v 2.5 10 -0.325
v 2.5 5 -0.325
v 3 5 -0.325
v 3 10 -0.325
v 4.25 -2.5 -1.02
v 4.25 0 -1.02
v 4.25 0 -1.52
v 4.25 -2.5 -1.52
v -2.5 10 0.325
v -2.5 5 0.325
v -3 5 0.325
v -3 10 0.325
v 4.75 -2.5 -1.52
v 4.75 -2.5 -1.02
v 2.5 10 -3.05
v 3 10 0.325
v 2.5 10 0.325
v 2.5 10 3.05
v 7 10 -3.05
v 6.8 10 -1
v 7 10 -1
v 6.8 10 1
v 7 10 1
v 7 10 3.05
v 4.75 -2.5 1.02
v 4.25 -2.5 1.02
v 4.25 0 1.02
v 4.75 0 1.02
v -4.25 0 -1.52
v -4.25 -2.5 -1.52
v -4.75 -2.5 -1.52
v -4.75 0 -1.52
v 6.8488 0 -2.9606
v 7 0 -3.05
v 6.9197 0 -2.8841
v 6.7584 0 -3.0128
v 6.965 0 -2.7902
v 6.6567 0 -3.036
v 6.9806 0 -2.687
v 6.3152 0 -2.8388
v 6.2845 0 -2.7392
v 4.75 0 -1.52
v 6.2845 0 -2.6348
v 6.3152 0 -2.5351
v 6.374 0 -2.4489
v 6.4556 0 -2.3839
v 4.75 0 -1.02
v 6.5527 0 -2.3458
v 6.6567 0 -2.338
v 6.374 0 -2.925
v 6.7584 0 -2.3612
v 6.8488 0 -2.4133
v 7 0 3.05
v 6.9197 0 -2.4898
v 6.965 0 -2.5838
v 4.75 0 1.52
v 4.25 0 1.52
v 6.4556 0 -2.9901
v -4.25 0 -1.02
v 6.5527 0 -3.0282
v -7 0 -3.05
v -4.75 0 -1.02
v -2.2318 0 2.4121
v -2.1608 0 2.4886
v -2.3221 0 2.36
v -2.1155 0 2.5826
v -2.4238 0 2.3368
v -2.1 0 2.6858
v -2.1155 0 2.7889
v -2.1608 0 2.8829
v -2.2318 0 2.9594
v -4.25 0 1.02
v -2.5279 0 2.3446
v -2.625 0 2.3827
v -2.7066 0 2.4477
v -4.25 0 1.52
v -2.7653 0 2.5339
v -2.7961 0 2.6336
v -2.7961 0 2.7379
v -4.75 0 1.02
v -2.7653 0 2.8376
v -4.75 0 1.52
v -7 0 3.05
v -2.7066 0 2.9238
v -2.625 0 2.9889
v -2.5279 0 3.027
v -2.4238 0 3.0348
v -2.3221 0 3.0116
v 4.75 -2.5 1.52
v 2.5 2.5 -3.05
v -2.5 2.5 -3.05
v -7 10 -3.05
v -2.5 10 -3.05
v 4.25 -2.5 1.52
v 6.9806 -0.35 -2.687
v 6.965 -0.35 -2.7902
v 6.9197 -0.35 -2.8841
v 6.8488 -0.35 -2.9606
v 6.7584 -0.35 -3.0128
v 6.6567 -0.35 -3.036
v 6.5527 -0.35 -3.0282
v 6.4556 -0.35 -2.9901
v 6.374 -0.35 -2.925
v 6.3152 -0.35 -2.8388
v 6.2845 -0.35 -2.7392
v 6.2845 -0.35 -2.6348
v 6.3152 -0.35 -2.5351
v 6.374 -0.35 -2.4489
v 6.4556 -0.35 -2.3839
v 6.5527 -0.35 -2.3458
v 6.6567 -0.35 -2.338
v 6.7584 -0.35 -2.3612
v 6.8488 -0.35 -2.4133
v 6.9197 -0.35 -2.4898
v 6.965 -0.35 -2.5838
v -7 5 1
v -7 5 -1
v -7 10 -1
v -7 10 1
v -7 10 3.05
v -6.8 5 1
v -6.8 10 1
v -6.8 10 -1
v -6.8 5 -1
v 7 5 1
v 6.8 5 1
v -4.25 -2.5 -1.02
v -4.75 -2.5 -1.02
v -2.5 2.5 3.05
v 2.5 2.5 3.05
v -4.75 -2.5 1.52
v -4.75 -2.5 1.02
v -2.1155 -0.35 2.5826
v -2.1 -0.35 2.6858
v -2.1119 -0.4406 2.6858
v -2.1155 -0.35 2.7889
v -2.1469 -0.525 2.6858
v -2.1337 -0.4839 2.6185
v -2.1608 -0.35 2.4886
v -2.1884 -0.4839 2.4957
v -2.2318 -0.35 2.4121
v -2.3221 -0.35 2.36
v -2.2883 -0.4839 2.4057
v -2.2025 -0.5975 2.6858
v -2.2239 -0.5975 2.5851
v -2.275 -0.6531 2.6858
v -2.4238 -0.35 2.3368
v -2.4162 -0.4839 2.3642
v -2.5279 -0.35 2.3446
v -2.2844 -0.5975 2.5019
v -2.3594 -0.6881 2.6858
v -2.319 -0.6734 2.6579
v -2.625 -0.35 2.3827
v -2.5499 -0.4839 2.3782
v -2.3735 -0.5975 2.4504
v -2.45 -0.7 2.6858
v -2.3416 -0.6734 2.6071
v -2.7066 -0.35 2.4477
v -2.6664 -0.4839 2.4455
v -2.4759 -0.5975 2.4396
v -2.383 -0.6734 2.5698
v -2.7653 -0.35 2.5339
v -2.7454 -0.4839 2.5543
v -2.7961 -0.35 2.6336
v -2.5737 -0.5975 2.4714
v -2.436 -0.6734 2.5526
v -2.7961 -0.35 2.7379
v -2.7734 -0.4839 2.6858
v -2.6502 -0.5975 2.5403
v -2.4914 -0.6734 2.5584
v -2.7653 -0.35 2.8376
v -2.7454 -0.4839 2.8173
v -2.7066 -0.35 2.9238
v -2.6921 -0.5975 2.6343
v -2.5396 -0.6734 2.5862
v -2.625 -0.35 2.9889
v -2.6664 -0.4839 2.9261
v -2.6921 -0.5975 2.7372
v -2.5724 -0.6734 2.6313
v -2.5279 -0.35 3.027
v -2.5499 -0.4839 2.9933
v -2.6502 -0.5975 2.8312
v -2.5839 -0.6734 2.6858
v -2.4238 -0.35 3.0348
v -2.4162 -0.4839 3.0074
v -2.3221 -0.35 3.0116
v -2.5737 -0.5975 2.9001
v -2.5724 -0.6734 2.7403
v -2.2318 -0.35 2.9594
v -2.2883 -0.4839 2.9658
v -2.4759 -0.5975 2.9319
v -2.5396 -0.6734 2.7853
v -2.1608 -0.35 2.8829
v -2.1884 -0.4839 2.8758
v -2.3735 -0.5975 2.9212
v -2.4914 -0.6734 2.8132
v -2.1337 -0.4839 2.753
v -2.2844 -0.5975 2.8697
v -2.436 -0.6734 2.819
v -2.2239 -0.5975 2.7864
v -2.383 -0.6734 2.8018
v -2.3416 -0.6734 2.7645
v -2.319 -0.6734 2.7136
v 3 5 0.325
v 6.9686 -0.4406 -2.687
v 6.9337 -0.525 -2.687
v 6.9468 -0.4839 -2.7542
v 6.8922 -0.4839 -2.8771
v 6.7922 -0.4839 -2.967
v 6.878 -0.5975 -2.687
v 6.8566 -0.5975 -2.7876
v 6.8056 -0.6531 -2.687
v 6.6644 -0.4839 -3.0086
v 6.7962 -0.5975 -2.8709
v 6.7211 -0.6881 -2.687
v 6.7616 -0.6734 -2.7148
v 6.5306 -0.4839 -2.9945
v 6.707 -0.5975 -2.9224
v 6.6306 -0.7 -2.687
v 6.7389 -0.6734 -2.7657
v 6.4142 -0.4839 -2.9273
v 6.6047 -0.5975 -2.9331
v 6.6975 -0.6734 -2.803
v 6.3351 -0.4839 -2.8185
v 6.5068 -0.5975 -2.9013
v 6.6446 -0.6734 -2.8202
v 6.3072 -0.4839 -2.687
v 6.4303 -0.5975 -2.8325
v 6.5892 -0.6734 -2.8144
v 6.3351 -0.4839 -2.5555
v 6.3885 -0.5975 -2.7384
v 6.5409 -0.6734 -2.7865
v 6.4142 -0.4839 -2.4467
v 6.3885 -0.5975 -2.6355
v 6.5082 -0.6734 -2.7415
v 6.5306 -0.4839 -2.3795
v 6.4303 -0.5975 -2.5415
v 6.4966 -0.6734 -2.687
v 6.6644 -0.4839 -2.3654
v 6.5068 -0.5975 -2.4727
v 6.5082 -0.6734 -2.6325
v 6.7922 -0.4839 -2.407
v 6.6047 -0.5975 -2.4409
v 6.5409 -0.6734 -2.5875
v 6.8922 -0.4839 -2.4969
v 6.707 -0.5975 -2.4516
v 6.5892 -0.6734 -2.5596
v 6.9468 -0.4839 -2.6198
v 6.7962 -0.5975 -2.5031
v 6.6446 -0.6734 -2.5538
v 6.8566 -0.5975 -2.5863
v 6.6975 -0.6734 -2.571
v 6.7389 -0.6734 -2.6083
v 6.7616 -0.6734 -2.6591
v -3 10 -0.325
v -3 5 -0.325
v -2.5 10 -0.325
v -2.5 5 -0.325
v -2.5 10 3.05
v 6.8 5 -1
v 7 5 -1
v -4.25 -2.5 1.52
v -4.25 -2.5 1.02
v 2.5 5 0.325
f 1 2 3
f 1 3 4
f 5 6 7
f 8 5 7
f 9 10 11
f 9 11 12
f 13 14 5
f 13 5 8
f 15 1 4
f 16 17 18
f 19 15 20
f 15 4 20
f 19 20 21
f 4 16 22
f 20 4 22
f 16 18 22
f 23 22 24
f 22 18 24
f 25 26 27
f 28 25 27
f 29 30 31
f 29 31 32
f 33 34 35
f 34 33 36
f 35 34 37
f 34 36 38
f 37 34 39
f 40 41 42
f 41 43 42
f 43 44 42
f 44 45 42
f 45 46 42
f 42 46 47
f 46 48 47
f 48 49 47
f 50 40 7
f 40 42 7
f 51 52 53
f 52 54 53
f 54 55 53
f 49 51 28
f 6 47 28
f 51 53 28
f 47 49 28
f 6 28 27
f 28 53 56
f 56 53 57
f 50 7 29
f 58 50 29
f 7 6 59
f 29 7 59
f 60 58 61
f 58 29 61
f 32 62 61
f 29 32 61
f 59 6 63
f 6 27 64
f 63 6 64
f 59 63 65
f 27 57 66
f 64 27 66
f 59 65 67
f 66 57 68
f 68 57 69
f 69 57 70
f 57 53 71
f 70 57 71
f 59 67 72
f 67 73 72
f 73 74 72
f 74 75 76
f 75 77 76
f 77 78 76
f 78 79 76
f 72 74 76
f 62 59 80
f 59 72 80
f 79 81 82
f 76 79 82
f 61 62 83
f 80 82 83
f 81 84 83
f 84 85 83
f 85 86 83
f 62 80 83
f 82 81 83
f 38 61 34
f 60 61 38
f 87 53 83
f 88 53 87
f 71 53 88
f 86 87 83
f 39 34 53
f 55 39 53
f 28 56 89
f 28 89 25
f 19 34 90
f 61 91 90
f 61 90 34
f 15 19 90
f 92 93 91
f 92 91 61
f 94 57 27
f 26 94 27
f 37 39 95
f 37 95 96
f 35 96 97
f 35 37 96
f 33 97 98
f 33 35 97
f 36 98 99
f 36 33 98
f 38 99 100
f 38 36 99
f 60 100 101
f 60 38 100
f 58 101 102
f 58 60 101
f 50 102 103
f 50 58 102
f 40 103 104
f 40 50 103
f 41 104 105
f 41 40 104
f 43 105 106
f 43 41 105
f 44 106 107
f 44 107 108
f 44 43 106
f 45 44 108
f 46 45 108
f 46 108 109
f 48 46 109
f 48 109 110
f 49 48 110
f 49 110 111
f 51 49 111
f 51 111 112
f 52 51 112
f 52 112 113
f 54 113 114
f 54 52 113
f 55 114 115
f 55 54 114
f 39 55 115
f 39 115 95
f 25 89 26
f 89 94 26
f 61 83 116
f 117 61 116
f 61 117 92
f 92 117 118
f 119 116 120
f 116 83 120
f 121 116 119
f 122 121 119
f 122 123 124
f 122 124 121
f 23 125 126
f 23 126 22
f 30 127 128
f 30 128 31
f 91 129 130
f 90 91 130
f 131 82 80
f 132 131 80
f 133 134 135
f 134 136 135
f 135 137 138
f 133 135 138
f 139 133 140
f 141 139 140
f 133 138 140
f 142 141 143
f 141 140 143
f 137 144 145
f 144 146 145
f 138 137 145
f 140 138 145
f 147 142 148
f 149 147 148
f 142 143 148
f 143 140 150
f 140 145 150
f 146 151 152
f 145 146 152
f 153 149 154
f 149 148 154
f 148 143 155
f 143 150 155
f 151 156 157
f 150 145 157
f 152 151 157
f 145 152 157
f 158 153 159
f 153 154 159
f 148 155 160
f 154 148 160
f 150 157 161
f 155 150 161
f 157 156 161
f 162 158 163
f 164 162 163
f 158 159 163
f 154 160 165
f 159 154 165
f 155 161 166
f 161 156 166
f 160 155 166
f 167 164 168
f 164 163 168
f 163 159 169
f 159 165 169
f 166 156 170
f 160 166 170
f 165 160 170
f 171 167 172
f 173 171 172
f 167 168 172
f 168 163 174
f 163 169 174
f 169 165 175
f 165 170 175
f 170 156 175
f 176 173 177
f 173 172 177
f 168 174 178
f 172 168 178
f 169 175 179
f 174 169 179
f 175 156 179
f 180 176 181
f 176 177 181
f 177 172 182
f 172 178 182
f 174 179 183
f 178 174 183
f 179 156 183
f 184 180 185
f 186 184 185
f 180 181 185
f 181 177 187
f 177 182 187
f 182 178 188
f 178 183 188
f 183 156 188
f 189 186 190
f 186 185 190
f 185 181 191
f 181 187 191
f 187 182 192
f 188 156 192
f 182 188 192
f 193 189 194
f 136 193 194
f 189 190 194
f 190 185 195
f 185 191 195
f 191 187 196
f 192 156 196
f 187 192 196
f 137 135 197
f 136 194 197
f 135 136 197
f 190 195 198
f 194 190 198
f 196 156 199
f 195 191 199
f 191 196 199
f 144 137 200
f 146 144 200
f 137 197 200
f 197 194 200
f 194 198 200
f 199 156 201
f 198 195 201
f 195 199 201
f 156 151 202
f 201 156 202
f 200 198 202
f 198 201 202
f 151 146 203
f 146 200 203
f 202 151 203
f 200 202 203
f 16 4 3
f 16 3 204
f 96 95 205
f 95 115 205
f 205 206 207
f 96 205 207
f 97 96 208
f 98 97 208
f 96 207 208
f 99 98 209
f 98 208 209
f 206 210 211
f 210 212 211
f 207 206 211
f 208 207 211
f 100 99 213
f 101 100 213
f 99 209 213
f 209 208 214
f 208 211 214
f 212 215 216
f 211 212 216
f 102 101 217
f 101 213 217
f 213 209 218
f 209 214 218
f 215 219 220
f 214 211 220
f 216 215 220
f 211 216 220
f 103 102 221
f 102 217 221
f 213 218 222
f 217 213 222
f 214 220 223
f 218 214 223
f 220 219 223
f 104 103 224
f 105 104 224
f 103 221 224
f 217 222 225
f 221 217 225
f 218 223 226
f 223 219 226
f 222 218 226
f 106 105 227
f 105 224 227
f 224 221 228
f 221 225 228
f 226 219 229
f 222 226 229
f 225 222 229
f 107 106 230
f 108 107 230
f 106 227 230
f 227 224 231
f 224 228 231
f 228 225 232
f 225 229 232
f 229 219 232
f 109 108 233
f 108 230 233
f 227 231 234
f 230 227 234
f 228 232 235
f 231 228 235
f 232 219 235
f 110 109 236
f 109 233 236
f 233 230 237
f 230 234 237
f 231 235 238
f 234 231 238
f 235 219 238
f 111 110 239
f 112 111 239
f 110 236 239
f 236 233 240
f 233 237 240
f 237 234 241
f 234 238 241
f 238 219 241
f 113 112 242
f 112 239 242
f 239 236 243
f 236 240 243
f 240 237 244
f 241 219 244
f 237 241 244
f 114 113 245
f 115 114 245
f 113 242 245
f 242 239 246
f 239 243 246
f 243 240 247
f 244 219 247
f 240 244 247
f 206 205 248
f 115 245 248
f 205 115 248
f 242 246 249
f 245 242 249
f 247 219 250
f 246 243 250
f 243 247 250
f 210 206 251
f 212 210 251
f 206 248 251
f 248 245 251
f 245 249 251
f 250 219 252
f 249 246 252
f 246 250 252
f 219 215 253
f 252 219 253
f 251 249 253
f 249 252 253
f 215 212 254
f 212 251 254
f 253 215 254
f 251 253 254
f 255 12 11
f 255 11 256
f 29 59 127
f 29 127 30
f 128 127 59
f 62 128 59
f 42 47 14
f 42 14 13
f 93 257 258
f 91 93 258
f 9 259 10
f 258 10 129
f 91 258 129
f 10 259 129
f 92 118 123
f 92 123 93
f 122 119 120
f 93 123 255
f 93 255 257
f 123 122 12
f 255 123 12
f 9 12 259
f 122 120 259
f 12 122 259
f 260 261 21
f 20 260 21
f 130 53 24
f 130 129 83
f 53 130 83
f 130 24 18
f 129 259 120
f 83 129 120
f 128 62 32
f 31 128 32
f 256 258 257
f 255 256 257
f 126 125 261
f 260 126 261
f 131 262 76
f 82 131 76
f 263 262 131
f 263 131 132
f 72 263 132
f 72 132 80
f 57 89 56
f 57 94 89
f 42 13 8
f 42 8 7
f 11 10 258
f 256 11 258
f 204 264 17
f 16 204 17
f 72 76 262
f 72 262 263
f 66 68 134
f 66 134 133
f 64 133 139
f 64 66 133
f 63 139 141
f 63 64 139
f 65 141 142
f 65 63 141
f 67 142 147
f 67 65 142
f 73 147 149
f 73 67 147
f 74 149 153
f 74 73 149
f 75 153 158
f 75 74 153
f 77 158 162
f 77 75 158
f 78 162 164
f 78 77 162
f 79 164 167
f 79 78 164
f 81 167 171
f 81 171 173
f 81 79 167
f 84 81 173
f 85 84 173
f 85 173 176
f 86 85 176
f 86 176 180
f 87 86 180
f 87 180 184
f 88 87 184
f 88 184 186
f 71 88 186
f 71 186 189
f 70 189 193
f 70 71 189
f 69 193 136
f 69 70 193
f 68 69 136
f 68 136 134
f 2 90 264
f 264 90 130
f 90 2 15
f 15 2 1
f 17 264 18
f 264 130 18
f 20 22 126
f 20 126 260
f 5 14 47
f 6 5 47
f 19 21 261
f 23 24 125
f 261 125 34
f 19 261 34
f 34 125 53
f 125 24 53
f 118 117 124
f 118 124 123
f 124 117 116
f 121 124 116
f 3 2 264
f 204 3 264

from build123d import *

# Parameters (mm, degrees)
EXTRUDE1_DEPTH           = 3.05
EXTRUDE1_DEPTH_BACK      = 3.05
EXTRUDE_THIN1_DEPTH      = 0.25
EXTRUDE_THIN1_DEPTH_BACK = 0.25
SKETCH2_W                = 0.5
SKETCH2_H                = 2.5
EXTRUDE_THIN2_DEPTH      = 0.25
EXTRUDE_THIN2_DEPTH_BACK = 0.25
SKETCH2_3_W              = 0.5
SKETCH2_3_H              = 2.5
EXTRUDE_THIN3_DEPTH      = 0.25
EXTRUDE_THIN3_DEPTH_BACK = 0.25
SKETCH3_W                = 0.5
SKETCH3_H                = 2.5
EXTRUDE_THIN4_DEPTH      = 0.25
EXTRUDE_THIN4_DEPTH_BACK = 0.25
SKETCH3_3_W              = 0.5
SKETCH3_3_H              = 2.5
SKETCH4_R                = 0.35
EXTRUDE2_DEPTH           = 0.7
FILLET1_R                = 0.35
SKETCH5_W                = 2
SKETCH5_H                = 5
CUT_EXTRUDE1_DEPTH       = 0.2
SKETCH6_W                = 2
SKETCH6_H                = 5
CUT_EXTRUDE2_DEPTH       = 0.2
SKETCH7_W                = 0.65
SKETCH7_H                = 5.045356776
CUT_EXTRUDE3_DEPTH       = 0.5
SKETCH8_W                = 0.65
SKETCH8_H                = 5.045356776
CUT_EXTRUDE4_DEPTH       = 0.5


with BuildPart() as part:
    # Sketch1 → Extrude1 (new, two sides: drawn at the far end of the back side and taken through both)
    with BuildSketch(Plane.XY.offset(-EXTRUDE1_DEPTH_BACK)):
        Polygon((2.5, 10), (7, 10), (7, 0), (-7, 0), (-7, 10), (-2.5, 10), (-2.5, 2.5), (2.5, 2.5), align=None)
    extrude(amount=EXTRUDE1_DEPTH + EXTRUDE1_DEPTH_BACK)

    # Sketch2 → Extrude-Thin1 (add, two sides: drawn at the far end of the back side and taken through both)
    with BuildSketch(Plane(origin=(4.5, 0, 0), x_dir=(0, 0, -1), z_dir=(1, 0, 0)).offset(-EXTRUDE_THIN1_DEPTH_BACK)):
        with Locations((1.27, -1.25)):
            Rectangle(SKETCH2_W, SKETCH2_H)
    extrude(amount=EXTRUDE_THIN1_DEPTH + EXTRUDE_THIN1_DEPTH_BACK)

    # Sketch2<3> → Extrude-Thin2 (add, two sides: drawn at the far end of the back side and taken through both)
    with BuildSketch(Plane(origin=(4.5, 0, 0), x_dir=(0, 0, -1), z_dir=(1, 0, 0)).offset(-EXTRUDE_THIN2_DEPTH_BACK)):
        with Locations((-1.27, -1.25)):
            Rectangle(SKETCH2_3_W, SKETCH2_3_H)
    extrude(amount=EXTRUDE_THIN2_DEPTH + EXTRUDE_THIN2_DEPTH_BACK)

    # Sketch3 → Extrude-Thin3 (add, two sides: drawn at the far end of the back side and taken through both)
    with BuildSketch(Plane(origin=(-4.5, 0, 0), x_dir=(0, 0, -1), z_dir=(1, 0, 0)).offset(-EXTRUDE_THIN3_DEPTH_BACK)):
        with Locations((1.27, -1.25)):
            Rectangle(SKETCH3_W, SKETCH3_H)
    extrude(amount=EXTRUDE_THIN3_DEPTH + EXTRUDE_THIN3_DEPTH_BACK)

    # Sketch3<3> → Extrude-Thin4 (add, two sides: drawn at the far end of the back side and taken through both)
    with BuildSketch(Plane(origin=(-4.5, 0, 0), x_dir=(0, 0, -1), z_dir=(1, 0, 0)).offset(-EXTRUDE_THIN4_DEPTH_BACK)):
        with Locations((-1.27, -1.25)):
            Rectangle(SKETCH3_3_W, SKETCH3_3_H)
    extrude(amount=EXTRUDE_THIN4_DEPTH + EXTRUDE_THIN4_DEPTH_BACK)

    # Sketch4 → Extrude2 (add)
    with BuildSketch(Plane(origin=(0, 0, 0), x_dir=(1, 0, 0), z_dir=(0, 1, 0))):
        with Locations((-2.45, -2.685779489)):
            Circle(SKETCH4_R)
        with Locations((6.630550891, 2.686987207)):
            Circle(SKETCH4_R)
    extrude(amount=-EXTRUDE2_DEPTH)

    # Fillet1
    fillet1_edges = [part.edges().sort_by_distance(p)[0] for p in [
        (6.280550891, -0.7, -2.686987207),
        (-2.8, -0.7, 2.685779489),
    ]]
    fillet(fillet1_edges, radius=FILLET1_R)

    # Sketch5 → Cut-Extrude1 (cut)
    with BuildSketch(Plane(origin=(7, 0, 0), x_dir=(0, 0, -1), z_dir=(1, 0, 0))):
        with Locations((0, 7.5)):
            Rectangle(SKETCH5_W, SKETCH5_H)
    extrude(amount=-CUT_EXTRUDE1_DEPTH, mode=Mode.SUBTRACT)

    # Sketch6 → Cut-Extrude2 (cut)
    with BuildSketch(Plane.ZY.offset(7)):
        with Locations((0, 7.5)):
            Rectangle(SKETCH6_W, SKETCH6_H)
    extrude(amount=-CUT_EXTRUDE2_DEPTH, mode=Mode.SUBTRACT)

    # Sketch7 → Cut-Extrude3 (cut)
    with BuildSketch(Plane.ZY.offset(-2.5)):
        with Locations((0, 7.522678388)):
            Rectangle(SKETCH7_W, SKETCH7_H)
    extrude(amount=-CUT_EXTRUDE3_DEPTH, mode=Mode.SUBTRACT)

    # Sketch8 → Cut-Extrude4 (cut)
    with BuildSketch(Plane(origin=(-2.5, 0, 0), x_dir=(0, 0, -1), z_dir=(1, 0, 0))):
        with Locations((0, 7.522678388)):
            Rectangle(SKETCH8_W, SKETCH8_H)
    extrude(amount=-CUT_EXTRUDE4_DEPTH, mode=Mode.SUBTRACT)


solid = part.part
